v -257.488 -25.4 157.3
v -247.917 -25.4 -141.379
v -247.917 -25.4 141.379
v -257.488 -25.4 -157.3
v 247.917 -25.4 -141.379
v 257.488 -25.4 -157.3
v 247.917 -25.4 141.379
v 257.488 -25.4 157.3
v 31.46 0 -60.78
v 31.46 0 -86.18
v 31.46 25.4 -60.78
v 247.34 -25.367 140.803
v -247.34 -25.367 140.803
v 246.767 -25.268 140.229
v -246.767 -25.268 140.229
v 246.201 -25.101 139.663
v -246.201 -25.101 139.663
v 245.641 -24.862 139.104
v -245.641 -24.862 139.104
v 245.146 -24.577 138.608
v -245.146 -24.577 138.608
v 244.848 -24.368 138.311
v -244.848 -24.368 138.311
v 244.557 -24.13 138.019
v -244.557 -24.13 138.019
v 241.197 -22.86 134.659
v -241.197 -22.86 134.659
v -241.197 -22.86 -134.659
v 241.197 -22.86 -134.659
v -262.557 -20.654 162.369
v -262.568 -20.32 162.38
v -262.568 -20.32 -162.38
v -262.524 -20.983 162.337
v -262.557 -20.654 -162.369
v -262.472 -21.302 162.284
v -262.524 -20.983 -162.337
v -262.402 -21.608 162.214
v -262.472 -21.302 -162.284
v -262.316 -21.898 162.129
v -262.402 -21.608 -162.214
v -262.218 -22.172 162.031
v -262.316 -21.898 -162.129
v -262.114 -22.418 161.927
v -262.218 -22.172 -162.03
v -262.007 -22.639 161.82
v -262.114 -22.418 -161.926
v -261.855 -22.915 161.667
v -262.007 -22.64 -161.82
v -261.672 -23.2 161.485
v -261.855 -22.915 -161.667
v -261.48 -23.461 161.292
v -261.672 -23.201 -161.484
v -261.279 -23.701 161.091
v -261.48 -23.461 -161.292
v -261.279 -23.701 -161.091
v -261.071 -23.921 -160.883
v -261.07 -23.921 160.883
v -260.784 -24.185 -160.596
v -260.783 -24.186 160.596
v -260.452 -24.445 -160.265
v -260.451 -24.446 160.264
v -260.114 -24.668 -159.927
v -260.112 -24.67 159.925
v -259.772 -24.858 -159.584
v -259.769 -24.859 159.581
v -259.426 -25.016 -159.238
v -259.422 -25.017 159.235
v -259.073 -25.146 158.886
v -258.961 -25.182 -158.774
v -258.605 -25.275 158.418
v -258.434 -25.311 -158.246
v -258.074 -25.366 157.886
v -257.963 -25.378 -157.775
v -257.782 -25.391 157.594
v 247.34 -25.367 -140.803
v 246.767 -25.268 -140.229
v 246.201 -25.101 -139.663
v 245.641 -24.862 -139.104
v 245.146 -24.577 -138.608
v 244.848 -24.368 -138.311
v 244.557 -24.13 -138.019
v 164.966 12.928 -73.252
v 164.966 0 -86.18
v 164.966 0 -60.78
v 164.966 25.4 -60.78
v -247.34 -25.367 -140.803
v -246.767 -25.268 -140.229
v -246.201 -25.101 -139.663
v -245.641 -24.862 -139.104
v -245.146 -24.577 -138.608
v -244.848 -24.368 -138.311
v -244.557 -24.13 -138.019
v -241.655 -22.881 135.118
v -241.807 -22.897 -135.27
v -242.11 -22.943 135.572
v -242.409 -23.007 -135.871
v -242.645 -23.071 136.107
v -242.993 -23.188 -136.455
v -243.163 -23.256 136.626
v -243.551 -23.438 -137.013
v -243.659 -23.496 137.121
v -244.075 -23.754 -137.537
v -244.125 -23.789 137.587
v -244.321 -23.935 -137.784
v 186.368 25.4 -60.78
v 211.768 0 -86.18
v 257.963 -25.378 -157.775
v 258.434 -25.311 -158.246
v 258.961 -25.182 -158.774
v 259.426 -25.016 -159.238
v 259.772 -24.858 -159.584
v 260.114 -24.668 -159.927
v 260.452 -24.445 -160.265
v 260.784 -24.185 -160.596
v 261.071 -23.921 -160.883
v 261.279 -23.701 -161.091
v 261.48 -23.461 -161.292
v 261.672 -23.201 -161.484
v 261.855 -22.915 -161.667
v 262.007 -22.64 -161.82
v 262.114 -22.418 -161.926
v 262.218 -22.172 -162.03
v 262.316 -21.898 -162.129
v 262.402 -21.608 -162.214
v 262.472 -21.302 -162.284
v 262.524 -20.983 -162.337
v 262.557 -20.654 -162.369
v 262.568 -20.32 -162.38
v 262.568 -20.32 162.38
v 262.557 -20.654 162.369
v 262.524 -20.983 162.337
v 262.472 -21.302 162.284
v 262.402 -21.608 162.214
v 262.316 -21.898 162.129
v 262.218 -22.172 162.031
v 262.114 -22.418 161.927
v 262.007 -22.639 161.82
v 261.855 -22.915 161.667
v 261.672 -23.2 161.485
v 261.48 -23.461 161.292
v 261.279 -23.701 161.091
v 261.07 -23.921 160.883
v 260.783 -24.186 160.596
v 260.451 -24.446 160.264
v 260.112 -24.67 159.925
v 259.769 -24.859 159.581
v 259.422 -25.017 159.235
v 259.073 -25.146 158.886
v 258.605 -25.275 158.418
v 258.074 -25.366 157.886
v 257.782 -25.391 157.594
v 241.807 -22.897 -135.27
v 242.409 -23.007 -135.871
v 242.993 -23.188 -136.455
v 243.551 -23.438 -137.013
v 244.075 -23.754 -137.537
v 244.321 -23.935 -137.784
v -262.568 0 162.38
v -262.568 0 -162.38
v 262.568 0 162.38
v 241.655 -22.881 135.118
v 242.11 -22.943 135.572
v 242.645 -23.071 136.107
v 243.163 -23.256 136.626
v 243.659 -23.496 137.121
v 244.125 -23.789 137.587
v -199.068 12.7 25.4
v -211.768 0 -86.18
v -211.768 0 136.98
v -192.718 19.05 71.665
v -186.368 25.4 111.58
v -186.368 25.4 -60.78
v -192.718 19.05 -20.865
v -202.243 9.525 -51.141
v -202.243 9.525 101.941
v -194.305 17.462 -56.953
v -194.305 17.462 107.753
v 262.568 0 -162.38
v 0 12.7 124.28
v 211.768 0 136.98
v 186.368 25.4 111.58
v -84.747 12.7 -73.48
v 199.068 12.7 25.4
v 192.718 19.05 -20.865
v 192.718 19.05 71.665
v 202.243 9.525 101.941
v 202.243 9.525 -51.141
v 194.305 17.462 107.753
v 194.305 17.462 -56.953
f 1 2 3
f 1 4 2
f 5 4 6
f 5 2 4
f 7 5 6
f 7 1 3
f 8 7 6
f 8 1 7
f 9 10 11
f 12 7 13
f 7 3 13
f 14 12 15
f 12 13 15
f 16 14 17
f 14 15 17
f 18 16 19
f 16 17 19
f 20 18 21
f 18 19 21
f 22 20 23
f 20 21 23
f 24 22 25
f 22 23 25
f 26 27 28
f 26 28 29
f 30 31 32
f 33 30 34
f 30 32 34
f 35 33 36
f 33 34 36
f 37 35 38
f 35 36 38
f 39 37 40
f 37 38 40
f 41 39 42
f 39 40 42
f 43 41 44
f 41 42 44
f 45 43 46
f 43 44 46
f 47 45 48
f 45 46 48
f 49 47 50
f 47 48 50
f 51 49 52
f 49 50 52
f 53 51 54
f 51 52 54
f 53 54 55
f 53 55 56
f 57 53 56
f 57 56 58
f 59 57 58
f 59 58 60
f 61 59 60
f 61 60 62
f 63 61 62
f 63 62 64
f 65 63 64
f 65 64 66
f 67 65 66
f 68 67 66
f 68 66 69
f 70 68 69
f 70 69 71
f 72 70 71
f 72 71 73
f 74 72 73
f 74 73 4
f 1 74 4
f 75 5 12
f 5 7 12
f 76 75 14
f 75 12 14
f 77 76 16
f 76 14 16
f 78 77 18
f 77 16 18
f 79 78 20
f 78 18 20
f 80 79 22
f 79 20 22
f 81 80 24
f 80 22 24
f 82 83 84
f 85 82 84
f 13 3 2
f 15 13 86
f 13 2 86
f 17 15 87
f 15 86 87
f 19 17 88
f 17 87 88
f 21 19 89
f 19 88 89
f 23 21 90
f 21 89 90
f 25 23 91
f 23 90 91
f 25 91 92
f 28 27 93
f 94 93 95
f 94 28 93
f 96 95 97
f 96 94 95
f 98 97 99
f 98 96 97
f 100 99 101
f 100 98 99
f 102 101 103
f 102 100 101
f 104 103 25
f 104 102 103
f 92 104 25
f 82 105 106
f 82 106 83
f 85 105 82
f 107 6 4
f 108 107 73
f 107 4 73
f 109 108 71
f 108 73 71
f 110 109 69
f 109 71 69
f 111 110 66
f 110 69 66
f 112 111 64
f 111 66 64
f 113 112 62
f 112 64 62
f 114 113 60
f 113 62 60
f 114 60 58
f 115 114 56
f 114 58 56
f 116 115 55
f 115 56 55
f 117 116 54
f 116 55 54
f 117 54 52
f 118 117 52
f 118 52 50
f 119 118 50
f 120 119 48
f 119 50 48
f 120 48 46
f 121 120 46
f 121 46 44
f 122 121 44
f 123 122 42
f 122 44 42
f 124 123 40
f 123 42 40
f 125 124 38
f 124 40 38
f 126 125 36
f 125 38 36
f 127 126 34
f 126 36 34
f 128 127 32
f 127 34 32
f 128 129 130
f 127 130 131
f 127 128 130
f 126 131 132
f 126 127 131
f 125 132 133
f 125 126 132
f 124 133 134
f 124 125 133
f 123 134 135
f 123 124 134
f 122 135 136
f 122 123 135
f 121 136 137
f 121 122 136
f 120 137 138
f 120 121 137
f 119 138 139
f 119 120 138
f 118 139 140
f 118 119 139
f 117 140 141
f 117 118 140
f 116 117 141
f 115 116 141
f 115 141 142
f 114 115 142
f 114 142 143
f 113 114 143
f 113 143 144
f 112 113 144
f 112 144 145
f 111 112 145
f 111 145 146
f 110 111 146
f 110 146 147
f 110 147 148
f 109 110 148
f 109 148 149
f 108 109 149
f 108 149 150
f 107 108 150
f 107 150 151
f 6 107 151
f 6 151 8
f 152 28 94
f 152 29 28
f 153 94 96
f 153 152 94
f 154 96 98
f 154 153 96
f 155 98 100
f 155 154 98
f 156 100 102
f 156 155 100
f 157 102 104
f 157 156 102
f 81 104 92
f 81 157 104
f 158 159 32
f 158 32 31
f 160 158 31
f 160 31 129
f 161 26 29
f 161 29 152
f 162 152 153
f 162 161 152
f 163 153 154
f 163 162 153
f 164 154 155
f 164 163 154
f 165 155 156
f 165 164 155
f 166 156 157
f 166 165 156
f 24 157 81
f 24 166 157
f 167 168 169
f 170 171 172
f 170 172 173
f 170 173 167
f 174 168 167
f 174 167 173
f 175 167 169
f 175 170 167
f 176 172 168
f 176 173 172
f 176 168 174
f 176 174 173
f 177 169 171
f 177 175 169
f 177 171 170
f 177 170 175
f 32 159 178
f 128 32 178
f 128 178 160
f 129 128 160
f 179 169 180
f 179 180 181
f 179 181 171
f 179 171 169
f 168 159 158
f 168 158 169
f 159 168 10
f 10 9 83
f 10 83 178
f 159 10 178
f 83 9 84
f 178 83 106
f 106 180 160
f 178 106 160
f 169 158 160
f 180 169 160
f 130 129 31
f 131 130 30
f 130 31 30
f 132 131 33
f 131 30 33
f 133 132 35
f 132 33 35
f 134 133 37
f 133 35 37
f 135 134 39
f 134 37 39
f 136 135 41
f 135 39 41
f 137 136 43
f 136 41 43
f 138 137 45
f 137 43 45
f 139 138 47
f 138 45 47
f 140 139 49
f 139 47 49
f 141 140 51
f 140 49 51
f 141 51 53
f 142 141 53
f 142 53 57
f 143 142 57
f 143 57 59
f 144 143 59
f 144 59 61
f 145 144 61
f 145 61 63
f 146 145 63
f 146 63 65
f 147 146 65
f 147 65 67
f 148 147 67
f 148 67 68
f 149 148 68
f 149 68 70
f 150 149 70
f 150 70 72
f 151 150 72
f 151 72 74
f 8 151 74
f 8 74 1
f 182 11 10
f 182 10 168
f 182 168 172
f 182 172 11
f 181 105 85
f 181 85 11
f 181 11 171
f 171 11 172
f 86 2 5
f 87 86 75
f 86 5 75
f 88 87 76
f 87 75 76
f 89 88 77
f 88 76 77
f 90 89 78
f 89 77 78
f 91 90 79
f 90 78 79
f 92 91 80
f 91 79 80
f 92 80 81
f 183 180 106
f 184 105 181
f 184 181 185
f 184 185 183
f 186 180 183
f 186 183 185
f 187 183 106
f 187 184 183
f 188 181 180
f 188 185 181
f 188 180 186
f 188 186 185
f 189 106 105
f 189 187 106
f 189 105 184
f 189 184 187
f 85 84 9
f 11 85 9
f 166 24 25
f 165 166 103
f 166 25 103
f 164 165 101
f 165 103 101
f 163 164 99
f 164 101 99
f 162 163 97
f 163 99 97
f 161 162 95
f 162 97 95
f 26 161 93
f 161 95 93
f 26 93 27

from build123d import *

# Parameters (mm, degrees)
F0_W         = 525.1352317132
F0_H         = 324.7600756863
F0_W_2       = 487.0352317132
F0_H_2       = 273.9600756863
F1_DEPTH     = 25.4
F2_DEPTH     = 22.86
F3_T1_DEPTH  = 550.5352317132
F3_T3_DEPTH  = 350.1600756863
F3_T5_DEPTH  = 487.0352317132
F3_T7_DEPTH  = 273.9600756863
F3_T13_DEPTH = 498.0337543413
F3_T17_DEPTH = 284.9585983143
F3_T24_DEPTH = 498.0337543413
F3_T28_DEPTH = 284.9585983143
F3_T35_DEPTH = 284.9585983143
F3_T39_DEPTH = 498.0337543413
F3_T46_DEPTH = 498.0337543413
F3_T50_DEPTH = 284.9585983143
F4_R         = 5.08
F5_W         = 423.5352317132
F5_H         = 223.1600756863
F6_DEPTH     = 25.4
F6_TAPER     = 45
F7_W         = 133.505359292
F7_H         = 25.4
F8_DEPTH     = 25.4


# Not quite as in the source:
# - a fillet or chamfer that OpenCascade refuses, or shapes differently, is made with other operations: its cross-section is extruded or revolved along the edge and cut away or added


with BuildPart() as f1:
    # F0 (on Front) → F1 (new body)
    with BuildSketch(Plane.XZ):
        Rectangle(F0_W, F0_H)
        Rectangle(F0_W_2, F0_H_2, mode=Mode.SUBTRACT)
    extrude(amount=F1_DEPTH)

    # F0 (on Front) → F2 (join)
    with BuildSketch(Plane.XZ):
        Polygon((-243.5176158566, 136.9800378431), (-243.5176158566, -136.9800378431), (243.5176158566, 136.9800378431), align=None)
        Polygon((-243.5176158566, -136.9800378431), (243.5176158566, -136.9800378431), (243.5176158566, 136.9800378431), align=None)
    extrude(amount=F2_DEPTH)

    # F3: fillet of radius 5.08 on 8 edges, made by hand

    # F3_s2 → F3_t1 (cut)
    with BuildSketch(Plane.YZ.offset(-275.2676158566)):
        with BuildLine():
            ThreePointArc((-20.32, 162.3800378431), (-23.9121024484, 160.8921402916), (-25.4, 157.3000378431))
            Line((-25.4, 157.3000378431), (-25.4, 162.3800378431))
            Line((-25.4, 162.3800378431), (-20.32, 162.3800378431))
        make_face()
        with BuildLine():
            ThreePointArc((-25.4, -157.3000378431), (-23.9121024484, -160.8921402916), (-20.32, -162.3800378431))
            Line((-20.32, -162.3800378431), (-25.4, -162.3800378431))
            Line((-25.4, -162.3800378431), (-25.4, -157.3000378431))
        make_face()
    extrude(amount=F3_T1_DEPTH, mode=Mode.SUBTRACT)

    # F3_s4 → F3_t3 (cut)
    with BuildSketch(Plane.XY.offset(-175.0800378431)):
        with BuildLine():
            ThreePointArc((-262.5676158566, -20.32), (-261.079718305, -23.9121024484), (-257.4876158566, -25.4))
            Line((-257.4876158566, -25.4), (-262.5676158566, -25.4))
            Line((-262.5676158566, -25.4), (-262.5676158566, -20.32))
        make_face()
        with BuildLine():
            ThreePointArc((262.5676158566, -20.32), (261.079718305, -23.9121024484), (257.4876158566, -25.4))
            Line((257.4876158566, -25.4), (262.5676158566, -25.4))
            Line((262.5676158566, -25.4), (262.5676158566, -20.32))
        make_face()
    extrude(amount=F3_T3_DEPTH, mode=Mode.SUBTRACT)

    # F3_s6 → F3_t5 (cut)
    with BuildSketch(Plane.YZ.offset(-243.5176158566)):
        with BuildLine():
            ThreePointArc((-25.4, 141.3794468944), (-24.7194090512, 138.8394468944), (-22.86, 136.9800378431))
            Line((-22.86, 136.9800378431), (-25.4, 136.9800378431))
            Line((-25.4, 136.9800378431), (-25.4, 141.3794468944))
        make_face()
        with BuildLine():
            ThreePointArc((-25.4, -141.3794468944), (-24.7194090512, -138.8394468944), (-22.86, -136.9800378431))
            Line((-22.86, -136.9800378431), (-25.4, -136.9800378431))
            Line((-25.4, -136.9800378431), (-25.4, -141.3794468944))
        make_face()
    extrude(amount=F3_T5_DEPTH, mode=Mode.SUBTRACT)

    # F3_s8 → F3_t7 (cut)
    with BuildSketch(Plane.XY.offset(-136.9800378431)):
        with BuildLine():
            ThreePointArc((247.9170249078, -25.4), (245.3770249078, -24.7194090512), (243.5176158566, -22.86))
            Line((243.5176158566, -22.86), (243.5176158566, -25.4))
            Line((243.5176158566, -25.4), (247.9170249078, -25.4))
        make_face()
        with BuildLine():
            ThreePointArc((-247.9170249078, -25.4), (-245.3770249078, -24.7194090512), (-243.5176158566, -22.86))
            Line((-243.5176158566, -22.86), (-243.5176158566, -25.4))
            Line((-243.5176158566, -25.4), (-247.9170249078, -25.4))
        make_face()
    extrude(amount=F3_T7_DEPTH, mode=Mode.SUBTRACT)


with BuildPart() as f3_tool11:
    # F3_s12 → F3_t13 (new body)
    with BuildSketch(Plane.YZ.offset(-254.5161384847)):
        with BuildLine():
            ThreePointArc((-25.4, 141.3794468944), (-24.7194090512, 138.8394468944), (-22.86, 136.9800378431))
            Line((-22.86, 136.9800378431), (-25.4, 136.9800378431))
            Line((-25.4, 136.9800378431), (-25.4, 141.3794468944))
        make_face()
    extrude(amount=F3_T13_DEPTH)

    split(bisect_by=Plane.YZ.offset(-243.5176158566), keep=Keep.BOTTOM)


with BuildPart() as f3_tool15:
    # F3_s16 → F3_t17 (new body)
    with BuildSketch(Plane.XY.offset(-136.9800378431)):
        with BuildLine():
            ThreePointArc((-247.9170249078, -25.4), (-245.3770249078, -24.7194090512), (-243.5176158566, -22.86))
            Line((-243.5176158566, -22.86), (-243.5176158566, -25.4))
            Line((-243.5176158566, -25.4), (-247.9170249078, -25.4))
        make_face()
    extrude(amount=F3_T17_DEPTH)

    split(bisect_by=Plane.XY.offset(136.9800378431), keep=Keep.TOP)


with BuildPart() as f3_tool11_1:
    add(f3_tool11.part)

    # F3_t19: intersect F3_tool15
    add(f3_tool15.part, mode=Mode.INTERSECT)


with BuildPart() as f1_1:
    add(f1.part)

    # F3_t9: cut F3_tool11
    add(f3_tool11_1.part, mode=Mode.SUBTRACT)


with BuildPart() as f3_tool22:
    # F3_s23 → F3_t24 (new body)
    with BuildSketch(Plane.YZ.offset(-243.5176158566)):
        with BuildLine():
            ThreePointArc((-25.4, 141.3794468944), (-24.7194090512, 138.8394468944), (-22.86, 136.9800378431))
            Line((-22.86, 136.9800378431), (-25.4, 136.9800378431))
            Line((-25.4, 136.9800378431), (-25.4, 141.3794468944))
        make_face()
    extrude(amount=F3_T24_DEPTH)

    split(bisect_by=Plane.YZ.offset(243.5176158566), keep=Keep.TOP)


with BuildPart() as f3_tool26:
    # F3_s27 → F3_t28 (new body)
    with BuildSketch(Plane.XY.offset(147.9785604712)):
        with BuildLine():
            ThreePointArc((247.9170249078, -25.4), (245.3770249078, -24.7194090512), (243.5176158566, -22.86))
            Line((243.5176158566, -22.86), (243.5176158566, -25.4))
            Line((243.5176158566, -25.4), (247.9170249078, -25.4))
        make_face()
    extrude(amount=-F3_T28_DEPTH)

    split(bisect_by=Plane.XY.offset(136.9800378431), keep=Keep.TOP)


with BuildPart() as f3_tool22_1:
    add(f3_tool22.part)

    # F3_t30: intersect F3_tool26
    add(f3_tool26.part, mode=Mode.INTERSECT)


with BuildPart() as f1_2:
    add(f1_1.part)

    # F3_t20: cut F3_tool22
    add(f3_tool22_1.part, mode=Mode.SUBTRACT)


with BuildPart() as f3_tool33:
    # F3_s34 → F3_t35 (new body)
    with BuildSketch(Plane.XY.offset(136.9800378431)):
        with BuildLine():
            ThreePointArc((247.9170249078, -25.4), (245.3770249078, -24.7194090512), (243.5176158566, -22.86))
            Line((243.5176158566, -22.86), (243.5176158566, -25.4))
            Line((243.5176158566, -25.4), (247.9170249078, -25.4))
        make_face()
    extrude(amount=-F3_T35_DEPTH)

    split(bisect_by=Plane.XY.offset(-136.9800378431), keep=Keep.BOTTOM)


with BuildPart() as f3_tool37:
    # F3_s38 → F3_t39 (new body)
    with BuildSketch(Plane.YZ.offset(254.5161384847)):
        with BuildLine():
            ThreePointArc((-25.4, -141.3794468944), (-24.7194090512, -138.8394468944), (-22.86, -136.9800378431))
            Line((-22.86, -136.9800378431), (-25.4, -136.9800378431))
            Line((-25.4, -136.9800378431), (-25.4, -141.3794468944))
        make_face()
    extrude(amount=-F3_T39_DEPTH)

    split(bisect_by=Plane.YZ.offset(243.5176158566), keep=Keep.TOP)


with BuildPart() as f3_tool33_1:
    add(f3_tool33.part)

    # F3_t41: intersect F3_tool37
    add(f3_tool37.part, mode=Mode.INTERSECT)


with BuildPart() as f1_3:
    add(f1_2.part)

    # F3_t31: cut F3_tool33
    add(f3_tool33_1.part, mode=Mode.SUBTRACT)


with BuildPart() as f3_tool44:
    # F3_s45 → F3_t46 (new body)
    with BuildSketch(Plane.YZ.offset(243.5176158566)):
        with BuildLine():
            ThreePointArc((-25.4, -141.3794468944), (-24.7194090512, -138.8394468944), (-22.86, -136.9800378431))
            Line((-22.86, -136.9800378431), (-25.4, -136.9800378431))
            Line((-25.4, -136.9800378431), (-25.4, -141.3794468944))
        make_face()
    extrude(amount=-F3_T46_DEPTH)

    split(bisect_by=Plane.YZ.offset(-243.5176158566), keep=Keep.BOTTOM)


with BuildPart() as f3_tool48:
    # F3_s49 → F3_t50 (new body)
    with BuildSketch(Plane.XY.offset(-147.9785604712)):
        with BuildLine():
            ThreePointArc((-247.9170249078, -25.4), (-245.3770249078, -24.7194090512), (-243.5176158566, -22.86))
            Line((-243.5176158566, -22.86), (-243.5176158566, -25.4))
            Line((-243.5176158566, -25.4), (-247.9170249078, -25.4))
        make_face()
    extrude(amount=F3_T50_DEPTH)

    split(bisect_by=Plane.XY.offset(-136.9800378431), keep=Keep.BOTTOM)


with BuildPart() as f3_tool44_1:
    add(f3_tool44.part)

    # F3_t52: intersect F3_tool48
    add(f3_tool48.part, mode=Mode.INTERSECT)


with BuildPart() as f1_4:
    add(f1_3.part)

    # F3_t42: cut F3_tool44
    add(f3_tool44_1.part, mode=Mode.SUBTRACT)

    # F4
    f4_edges = [f1_4.edges().sort_by_distance(p)[0] for p in [
        (0, -22.86, 136.980038),
        (-243.517616, -22.86, 0),
        (0, -22.86, -136.980038),
        (243.517616, -22.86, 0),
    ]]
    fillet(f4_edges, radius=F4_R)

    # F5 (on face) → F6 (join)
    with BuildSketch(Plane(origin=(0, 0, 0), x_dir=(-1, 0, 0), z_dir=(0, 1, 0))):
        with Locations((0, 25.4)):
            Rectangle(F5_W, F5_H)
    extrude(amount=F6_DEPTH, taper=F6_TAPER)

    # F7 (on face) → F8 (cut)
    with BuildSketch(Plane(origin=(0, 0, 0), x_dir=(-1, 0, 0), z_dir=(0, 1, 0))):
        with Locations((-98.213173449, -73.4800378431)):
            Rectangle(F7_W, F7_H)
    extrude(amount=F8_DEPTH, mode=Mode.SUBTRACT)


solid = f1_4.part
